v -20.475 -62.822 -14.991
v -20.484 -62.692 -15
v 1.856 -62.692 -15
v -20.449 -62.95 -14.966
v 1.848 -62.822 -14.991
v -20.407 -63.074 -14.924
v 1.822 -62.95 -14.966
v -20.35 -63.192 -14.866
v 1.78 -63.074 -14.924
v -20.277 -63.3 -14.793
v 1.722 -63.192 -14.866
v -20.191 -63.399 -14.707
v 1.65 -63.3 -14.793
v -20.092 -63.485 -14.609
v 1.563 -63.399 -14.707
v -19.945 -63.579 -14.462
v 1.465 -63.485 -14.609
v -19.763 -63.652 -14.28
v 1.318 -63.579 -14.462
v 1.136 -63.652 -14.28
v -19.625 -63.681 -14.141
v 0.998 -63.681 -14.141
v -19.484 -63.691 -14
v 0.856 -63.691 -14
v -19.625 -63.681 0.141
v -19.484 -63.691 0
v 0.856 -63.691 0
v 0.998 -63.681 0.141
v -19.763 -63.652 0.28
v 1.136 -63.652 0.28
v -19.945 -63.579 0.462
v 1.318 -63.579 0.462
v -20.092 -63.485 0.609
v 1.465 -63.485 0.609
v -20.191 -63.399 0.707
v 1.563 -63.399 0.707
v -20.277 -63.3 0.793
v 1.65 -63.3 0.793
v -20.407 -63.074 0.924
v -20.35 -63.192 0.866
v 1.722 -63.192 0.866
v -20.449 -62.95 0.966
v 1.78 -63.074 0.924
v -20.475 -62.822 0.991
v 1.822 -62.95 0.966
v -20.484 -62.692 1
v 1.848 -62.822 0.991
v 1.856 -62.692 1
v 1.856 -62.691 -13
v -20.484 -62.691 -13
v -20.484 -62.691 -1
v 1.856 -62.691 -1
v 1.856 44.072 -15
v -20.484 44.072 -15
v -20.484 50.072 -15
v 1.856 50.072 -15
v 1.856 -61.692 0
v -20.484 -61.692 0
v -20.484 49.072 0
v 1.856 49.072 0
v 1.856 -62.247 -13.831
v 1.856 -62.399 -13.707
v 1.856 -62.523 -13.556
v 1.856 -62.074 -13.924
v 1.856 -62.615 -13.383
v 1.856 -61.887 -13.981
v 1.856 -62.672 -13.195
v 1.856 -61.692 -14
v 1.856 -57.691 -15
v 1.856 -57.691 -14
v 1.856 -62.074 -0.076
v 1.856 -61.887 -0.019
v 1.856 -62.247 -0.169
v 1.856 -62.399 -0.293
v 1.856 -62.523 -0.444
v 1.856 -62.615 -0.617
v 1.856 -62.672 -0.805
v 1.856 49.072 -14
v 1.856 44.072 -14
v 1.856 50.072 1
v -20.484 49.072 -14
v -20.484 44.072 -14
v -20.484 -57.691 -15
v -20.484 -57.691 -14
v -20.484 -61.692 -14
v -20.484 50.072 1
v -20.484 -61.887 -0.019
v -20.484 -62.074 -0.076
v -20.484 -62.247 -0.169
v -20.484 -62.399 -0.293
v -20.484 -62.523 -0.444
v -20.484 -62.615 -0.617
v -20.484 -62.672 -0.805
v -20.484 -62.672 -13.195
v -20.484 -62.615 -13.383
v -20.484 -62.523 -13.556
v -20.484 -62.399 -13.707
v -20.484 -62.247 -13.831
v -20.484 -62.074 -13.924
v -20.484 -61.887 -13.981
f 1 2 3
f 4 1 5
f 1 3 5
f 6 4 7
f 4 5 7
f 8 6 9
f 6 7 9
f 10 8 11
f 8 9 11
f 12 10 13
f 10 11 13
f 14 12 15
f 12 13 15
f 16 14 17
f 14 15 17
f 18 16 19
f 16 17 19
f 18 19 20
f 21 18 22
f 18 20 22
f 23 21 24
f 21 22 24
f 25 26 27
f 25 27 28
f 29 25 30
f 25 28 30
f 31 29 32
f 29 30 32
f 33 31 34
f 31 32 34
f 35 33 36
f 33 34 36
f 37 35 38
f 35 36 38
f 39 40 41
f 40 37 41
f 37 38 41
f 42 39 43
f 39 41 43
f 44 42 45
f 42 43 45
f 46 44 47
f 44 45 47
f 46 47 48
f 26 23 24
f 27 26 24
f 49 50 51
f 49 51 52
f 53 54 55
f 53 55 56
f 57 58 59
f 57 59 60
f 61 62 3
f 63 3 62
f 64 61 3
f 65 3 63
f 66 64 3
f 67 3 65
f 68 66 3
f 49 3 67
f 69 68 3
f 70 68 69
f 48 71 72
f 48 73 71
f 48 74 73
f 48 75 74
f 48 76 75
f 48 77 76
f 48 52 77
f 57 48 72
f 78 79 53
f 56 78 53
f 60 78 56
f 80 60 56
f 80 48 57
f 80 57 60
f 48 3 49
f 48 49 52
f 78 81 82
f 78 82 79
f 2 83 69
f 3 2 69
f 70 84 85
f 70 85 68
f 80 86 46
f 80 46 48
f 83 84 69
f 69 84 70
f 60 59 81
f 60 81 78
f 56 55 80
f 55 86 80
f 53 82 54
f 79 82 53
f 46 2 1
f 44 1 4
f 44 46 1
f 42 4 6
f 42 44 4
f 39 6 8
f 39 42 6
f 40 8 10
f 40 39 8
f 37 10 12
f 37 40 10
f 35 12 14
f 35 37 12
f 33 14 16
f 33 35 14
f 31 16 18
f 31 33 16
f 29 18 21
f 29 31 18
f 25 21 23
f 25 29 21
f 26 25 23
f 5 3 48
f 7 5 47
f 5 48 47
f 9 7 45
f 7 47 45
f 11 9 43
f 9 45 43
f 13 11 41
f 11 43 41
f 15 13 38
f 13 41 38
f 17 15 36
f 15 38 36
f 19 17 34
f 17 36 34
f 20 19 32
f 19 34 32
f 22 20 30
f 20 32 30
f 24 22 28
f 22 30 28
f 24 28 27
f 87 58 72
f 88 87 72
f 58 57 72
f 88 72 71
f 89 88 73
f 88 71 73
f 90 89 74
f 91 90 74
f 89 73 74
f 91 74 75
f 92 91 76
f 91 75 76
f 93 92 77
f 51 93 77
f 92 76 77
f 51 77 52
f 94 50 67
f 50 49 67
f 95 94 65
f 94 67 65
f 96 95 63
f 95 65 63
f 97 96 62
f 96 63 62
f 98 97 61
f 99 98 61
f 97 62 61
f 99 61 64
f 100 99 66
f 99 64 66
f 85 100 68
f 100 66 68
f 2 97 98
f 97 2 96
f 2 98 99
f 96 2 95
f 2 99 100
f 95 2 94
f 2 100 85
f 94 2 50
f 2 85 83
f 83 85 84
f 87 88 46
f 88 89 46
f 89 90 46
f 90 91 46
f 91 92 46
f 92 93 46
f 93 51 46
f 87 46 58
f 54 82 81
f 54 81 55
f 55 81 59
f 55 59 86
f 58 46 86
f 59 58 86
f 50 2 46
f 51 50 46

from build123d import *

# Parameters (mm, degrees)
F0_W     = 22.3398831487
F0_H     = 111.7630600929
F1_DEPTH = 1
F2_DEPTH = 1
F3_DEPTH = 1
F4_DEPTH = 14
F5_DEPTH = 14
F6_DEPTH = 1
F7_DEPTH = 1
F8_DEPTH = 5
F9_DEPTH = 5
F11_R    = 0.9999


# Not quite as in the source:
# - a fillet or chamfer is up to 0.001 mm smaller than in the source, because OpenCascade refuses the exact size


with BuildPart() as f1:
    # F0 (on Top) → F1 (new body)
    with BuildSketch(Plane.XY):
        with Locations((-9.3135908246, -6.8099498749)):
            Rectangle(F0_W, F0_H)
    extrude(amount=F1_DEPTH)


with BuildPart() as f2:
    # F2 (new): a face of the model
    f2_faces = [f1.part.faces().sort_by_distance(p)[0] for p in [
        (-9.3135908246, -62.6914799213, 0.5),
    ]]
    extrude(f2_faces, amount=F2_DEPTH)


with BuildPart() as f3:
    # F3 (new): a face of the model
    f3_faces = [f1.part.faces().sort_by_distance(p)[0] for p in [
        (-9.3135908246, 49.0715801716, 0.5),
    ]]
    extrude(f3_faces, amount=F3_DEPTH)


with BuildPart() as f4:
    # F4 (new): a face of the model
    f4_faces = [f3.part.faces().sort_by_distance(p)[0] for p in [
        (-9.3135908246, 49.5715801716, 0),
    ]]
    extrude(f4_faces, amount=F4_DEPTH)


with BuildPart() as f5:
    # F5 (new): a face of the model
    f5_faces = [f2.part.faces().sort_by_distance(p)[0] for p in [
        (-9.3135908246, -63.1914799213, 0),
    ]]
    extrude(f5_faces, amount=F5_DEPTH)


with BuildPart() as f6:
    # F6 (new): a face of the model
    f6_faces = [f5.part.faces().sort_by_distance(p)[0] for p in [
        (-9.3135908246, -63.1914799213, -14),
    ]]
    extrude(f6_faces, amount=F6_DEPTH)


with BuildPart() as f7:
    # F7 (new): a face of the model
    f7_faces = [f4.part.faces().sort_by_distance(p)[0] for p in [
        (-9.3135908246, 49.5715801716, -14),
    ]]
    extrude(f7_faces, amount=F7_DEPTH)


with BuildPart() as f8:
    # F8 (new): a face of the model
    f8_faces = [f6.part.faces().sort_by_distance(p)[0] for p in [
        (-9.3135908246, -62.6914799213, -14.5),
    ]]
    extrude(f8_faces, amount=F8_DEPTH)


with BuildPart() as f9:
    # F9 (new): a face of the model
    f9_faces = [f7.part.faces().sort_by_distance(p)[0] for p in [
        (-9.3135908246, 49.0715801716, -14.5),
    ]]
    extrude(f9_faces, amount=F9_DEPTH)


with BuildPart() as f8_1:
    add(f8.part)

    # F10: union F6, F5, F2, F1, F3, F4, F9, F7
    add(f6.part)
    add(f5.part)
    add(f2.part)
    add(f1.part)
    add(f3.part)
    add(f4.part)
    add(f9.part)
    add(f7.part)

    # F11 (radius 1 in the source; OpenCascade refuses exactly that, so slightly less here)
    f11_edges = [f8_1.edges().sort_by_distance(p)[0] for p in [
        (-9.313591, -62.69148, 0),
        (-20.483532, -63.69148, -7),
        (-9.313591, -63.69148, -15),
        (1.856351, -63.69148, -7),
        (-9.313591, -63.69148, 1),
        (-9.313591, -62.69148, -14),
    ]]
    fillet(f11_edges, radius=F11_R)


solid = f8_1.part
